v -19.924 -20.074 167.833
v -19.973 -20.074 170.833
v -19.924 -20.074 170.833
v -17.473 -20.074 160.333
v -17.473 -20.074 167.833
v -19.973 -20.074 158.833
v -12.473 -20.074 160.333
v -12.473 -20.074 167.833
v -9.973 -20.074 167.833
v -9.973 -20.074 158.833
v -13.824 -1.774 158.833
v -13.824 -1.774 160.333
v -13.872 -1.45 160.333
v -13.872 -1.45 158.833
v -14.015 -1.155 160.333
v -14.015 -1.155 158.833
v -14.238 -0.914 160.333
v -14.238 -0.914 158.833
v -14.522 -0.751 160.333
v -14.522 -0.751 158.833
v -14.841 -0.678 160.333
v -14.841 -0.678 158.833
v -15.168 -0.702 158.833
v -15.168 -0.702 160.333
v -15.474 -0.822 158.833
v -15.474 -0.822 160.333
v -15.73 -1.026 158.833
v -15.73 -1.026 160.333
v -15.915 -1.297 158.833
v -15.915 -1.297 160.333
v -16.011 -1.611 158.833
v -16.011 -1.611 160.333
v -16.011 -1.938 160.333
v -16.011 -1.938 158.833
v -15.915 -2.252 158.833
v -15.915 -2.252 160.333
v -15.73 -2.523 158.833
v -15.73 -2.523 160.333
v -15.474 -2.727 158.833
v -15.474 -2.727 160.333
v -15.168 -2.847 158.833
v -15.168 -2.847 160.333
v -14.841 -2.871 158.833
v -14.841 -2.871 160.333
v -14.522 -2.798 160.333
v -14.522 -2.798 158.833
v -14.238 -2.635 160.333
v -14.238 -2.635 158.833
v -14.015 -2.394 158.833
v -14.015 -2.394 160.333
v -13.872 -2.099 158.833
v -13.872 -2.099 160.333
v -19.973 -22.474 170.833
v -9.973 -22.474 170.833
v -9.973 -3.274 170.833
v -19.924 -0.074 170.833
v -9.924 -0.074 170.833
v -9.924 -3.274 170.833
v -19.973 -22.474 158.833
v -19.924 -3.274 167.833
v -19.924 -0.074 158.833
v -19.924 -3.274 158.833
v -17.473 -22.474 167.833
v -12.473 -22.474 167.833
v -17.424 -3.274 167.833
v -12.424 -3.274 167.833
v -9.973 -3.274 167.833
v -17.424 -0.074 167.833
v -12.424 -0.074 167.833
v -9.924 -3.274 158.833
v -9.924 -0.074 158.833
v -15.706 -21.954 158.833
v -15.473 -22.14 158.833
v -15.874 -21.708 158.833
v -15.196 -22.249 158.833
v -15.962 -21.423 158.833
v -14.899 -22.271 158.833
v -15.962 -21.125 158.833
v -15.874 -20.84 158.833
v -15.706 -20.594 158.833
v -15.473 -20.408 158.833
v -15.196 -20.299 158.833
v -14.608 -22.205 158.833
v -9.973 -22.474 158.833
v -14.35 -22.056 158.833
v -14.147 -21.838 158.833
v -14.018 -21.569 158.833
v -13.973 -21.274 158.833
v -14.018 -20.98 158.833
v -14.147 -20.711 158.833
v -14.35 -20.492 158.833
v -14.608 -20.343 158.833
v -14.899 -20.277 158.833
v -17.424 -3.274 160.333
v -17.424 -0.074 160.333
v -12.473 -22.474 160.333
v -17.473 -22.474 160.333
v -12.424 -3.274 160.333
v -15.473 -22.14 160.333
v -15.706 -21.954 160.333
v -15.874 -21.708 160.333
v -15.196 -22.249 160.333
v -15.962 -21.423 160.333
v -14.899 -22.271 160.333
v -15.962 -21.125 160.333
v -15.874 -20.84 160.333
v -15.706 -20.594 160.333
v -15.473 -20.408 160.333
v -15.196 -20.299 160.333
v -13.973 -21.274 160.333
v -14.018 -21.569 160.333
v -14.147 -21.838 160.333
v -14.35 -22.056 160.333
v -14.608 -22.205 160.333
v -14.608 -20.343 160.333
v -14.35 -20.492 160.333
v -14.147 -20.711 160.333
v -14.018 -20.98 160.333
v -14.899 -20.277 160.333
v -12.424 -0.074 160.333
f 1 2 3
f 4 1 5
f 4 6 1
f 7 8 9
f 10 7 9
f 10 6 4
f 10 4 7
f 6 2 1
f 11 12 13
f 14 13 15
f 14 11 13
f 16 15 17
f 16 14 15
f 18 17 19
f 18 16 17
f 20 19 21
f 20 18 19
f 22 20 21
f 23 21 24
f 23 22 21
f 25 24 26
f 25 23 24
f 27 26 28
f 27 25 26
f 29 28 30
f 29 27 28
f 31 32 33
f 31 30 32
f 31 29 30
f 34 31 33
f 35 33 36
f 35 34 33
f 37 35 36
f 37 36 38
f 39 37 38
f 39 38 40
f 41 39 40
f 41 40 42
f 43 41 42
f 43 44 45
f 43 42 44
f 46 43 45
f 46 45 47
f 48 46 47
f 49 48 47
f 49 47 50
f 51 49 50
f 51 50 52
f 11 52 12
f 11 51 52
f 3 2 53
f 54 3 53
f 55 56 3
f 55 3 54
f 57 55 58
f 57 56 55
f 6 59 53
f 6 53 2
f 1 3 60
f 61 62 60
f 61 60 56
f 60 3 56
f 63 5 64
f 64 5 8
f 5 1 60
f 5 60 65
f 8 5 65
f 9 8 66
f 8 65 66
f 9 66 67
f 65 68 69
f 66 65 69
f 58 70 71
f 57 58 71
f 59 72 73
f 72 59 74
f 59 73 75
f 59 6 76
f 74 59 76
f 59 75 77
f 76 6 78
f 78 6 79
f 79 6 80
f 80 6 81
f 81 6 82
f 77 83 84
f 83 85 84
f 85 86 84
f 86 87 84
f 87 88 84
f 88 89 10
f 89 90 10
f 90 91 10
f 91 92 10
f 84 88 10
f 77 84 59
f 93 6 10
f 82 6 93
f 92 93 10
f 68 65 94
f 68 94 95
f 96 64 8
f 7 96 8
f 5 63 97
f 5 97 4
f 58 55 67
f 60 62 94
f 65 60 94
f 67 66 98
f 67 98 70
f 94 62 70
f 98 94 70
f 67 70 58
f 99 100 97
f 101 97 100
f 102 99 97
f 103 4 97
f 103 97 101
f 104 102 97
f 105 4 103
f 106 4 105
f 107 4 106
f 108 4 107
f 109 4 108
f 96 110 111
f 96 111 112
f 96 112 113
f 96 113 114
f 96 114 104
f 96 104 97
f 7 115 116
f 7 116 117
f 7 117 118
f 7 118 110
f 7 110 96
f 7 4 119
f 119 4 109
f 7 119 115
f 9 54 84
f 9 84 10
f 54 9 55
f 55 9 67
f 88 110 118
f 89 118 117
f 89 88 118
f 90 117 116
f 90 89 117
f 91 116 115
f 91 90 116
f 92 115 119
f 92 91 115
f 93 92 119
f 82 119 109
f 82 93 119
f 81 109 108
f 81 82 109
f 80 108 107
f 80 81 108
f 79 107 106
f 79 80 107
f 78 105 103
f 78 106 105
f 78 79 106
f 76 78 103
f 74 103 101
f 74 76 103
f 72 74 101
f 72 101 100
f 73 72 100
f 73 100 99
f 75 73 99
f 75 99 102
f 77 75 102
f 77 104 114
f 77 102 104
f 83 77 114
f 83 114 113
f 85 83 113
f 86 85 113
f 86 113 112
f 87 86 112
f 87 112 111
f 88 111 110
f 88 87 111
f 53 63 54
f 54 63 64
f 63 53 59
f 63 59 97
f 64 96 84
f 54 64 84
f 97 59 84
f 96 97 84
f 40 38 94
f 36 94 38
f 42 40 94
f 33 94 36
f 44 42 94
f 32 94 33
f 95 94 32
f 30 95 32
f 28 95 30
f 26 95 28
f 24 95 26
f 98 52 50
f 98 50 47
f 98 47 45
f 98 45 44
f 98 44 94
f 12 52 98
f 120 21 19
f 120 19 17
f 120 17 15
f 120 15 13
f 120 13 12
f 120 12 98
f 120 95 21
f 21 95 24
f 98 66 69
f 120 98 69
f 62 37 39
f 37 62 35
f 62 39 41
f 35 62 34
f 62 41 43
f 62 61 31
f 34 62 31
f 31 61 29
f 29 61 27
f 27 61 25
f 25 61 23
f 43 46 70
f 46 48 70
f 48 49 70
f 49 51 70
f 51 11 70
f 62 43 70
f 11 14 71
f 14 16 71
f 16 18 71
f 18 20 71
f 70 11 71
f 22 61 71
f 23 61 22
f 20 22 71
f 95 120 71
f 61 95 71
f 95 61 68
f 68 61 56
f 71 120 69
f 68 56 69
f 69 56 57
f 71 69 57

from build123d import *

# Parameters (mm, degrees)
SZKIC2_W                      = 10
SZKIC2_H                      = 3.2
SZKIC2_R                      = 1.10000034
DODANIE_WYCI_GNI_CIE1_DEPTH   = 12
SZKIC2_H_2                    = 2.4000007
SZKIC2_R_2                    = 1.00000054
DODANIE_WYCI_GNI_CIE1_2_DEPTH = 12
SZKIC3_W                      = 5
SZKIC3_H                      = 3.2
SZKIC3_H_2                    = 2.4000007
WYTNIJ_WYCI_GNI_CIE1_DEPTH    = 10.5
SZKIC4_W                      = 9.95021092
SZKIC4_H                      = 22.39976104
DODANIE_WYCI_GNI_CIE2_DEPTH   = 3


with BuildPart() as part:
    # Szkic2 → Dodanie-wyciągnięcie1 (new body)
    with BuildSketch(Plane.XY.offset(158.832884642)):
        with Locations((-14.923531216, -1.67449554)):
            Rectangle(SZKIC2_W, SZKIC2_H)
        with Locations((-14.923531216, -1.77449554)):
            Circle(SZKIC2_R, mode=Mode.SUBTRACT)
    extrude(amount=DODANIE_WYCI_GNI_CIE1_DEPTH)


with BuildPart() as body_2:
    # Szkic2 → Dodanie-wyci_gni_cie1 2 (new body)
    with BuildSketch(Plane.XY.offset(158.832884642)):
        with Locations((-14.973320296, -21.27425623)):
            Rectangle(SZKIC2_W, SZKIC2_H_2)
        with Locations((-14.973320296, -21.27425588)):
            Circle(SZKIC2_R_2, mode=Mode.SUBTRACT)
    extrude(amount=DODANIE_WYCI_GNI_CIE1_2_DEPTH)


with BuildPart() as wytnij_wyci_gni_cie1_tool:
    # Szkic3 → Wytnij-wyciągnięcie1 (new body)
    with BuildSketch(Plane.XY.offset(170.832884642)):
        with Locations((-14.923531216, -1.67449554)):
            Rectangle(SZKIC3_W, SZKIC3_H)
        with Locations((-14.973320296, -21.27425623)):
            Rectangle(SZKIC3_W, SZKIC3_H_2)
    extrude(amount=-WYTNIJ_WYCI_GNI_CIE1_DEPTH)


with BuildPart() as part_1:
    add(part.part)

    # Wytnij-wyciągnięcie1: cut by wytnij_wyci_gni_cie1_tool
    add(wytnij_wyci_gni_cie1_tool.part, mode=Mode.SUBTRACT)



with BuildPart() as body_2_1:
    add(body_2.part)

    # Wytnij-wyciągnięcie1: cut by wytnij_wyci_gni_cie1_tool
    add(wytnij_wyci_gni_cie1_tool.part, mode=Mode.SUBTRACT)


with BuildPart() as part_2:
    add(part_1.part)

    add(body_2_1.part)  # Dodanie-wyciągnięcie2 merges body 2
    # Szkic4 → Dodanie-wyciągnięcie2 (add)
    with BuildSketch(Plane.XY.offset(170.832884642)):
        with Locations((-14.948425756, -11.27437606)):
            Rectangle(SZKIC4_W, SZKIC4_H)
    extrude(amount=-DODANIE_WYCI_GNI_CIE2_DEPTH)


solid = part_2.part
